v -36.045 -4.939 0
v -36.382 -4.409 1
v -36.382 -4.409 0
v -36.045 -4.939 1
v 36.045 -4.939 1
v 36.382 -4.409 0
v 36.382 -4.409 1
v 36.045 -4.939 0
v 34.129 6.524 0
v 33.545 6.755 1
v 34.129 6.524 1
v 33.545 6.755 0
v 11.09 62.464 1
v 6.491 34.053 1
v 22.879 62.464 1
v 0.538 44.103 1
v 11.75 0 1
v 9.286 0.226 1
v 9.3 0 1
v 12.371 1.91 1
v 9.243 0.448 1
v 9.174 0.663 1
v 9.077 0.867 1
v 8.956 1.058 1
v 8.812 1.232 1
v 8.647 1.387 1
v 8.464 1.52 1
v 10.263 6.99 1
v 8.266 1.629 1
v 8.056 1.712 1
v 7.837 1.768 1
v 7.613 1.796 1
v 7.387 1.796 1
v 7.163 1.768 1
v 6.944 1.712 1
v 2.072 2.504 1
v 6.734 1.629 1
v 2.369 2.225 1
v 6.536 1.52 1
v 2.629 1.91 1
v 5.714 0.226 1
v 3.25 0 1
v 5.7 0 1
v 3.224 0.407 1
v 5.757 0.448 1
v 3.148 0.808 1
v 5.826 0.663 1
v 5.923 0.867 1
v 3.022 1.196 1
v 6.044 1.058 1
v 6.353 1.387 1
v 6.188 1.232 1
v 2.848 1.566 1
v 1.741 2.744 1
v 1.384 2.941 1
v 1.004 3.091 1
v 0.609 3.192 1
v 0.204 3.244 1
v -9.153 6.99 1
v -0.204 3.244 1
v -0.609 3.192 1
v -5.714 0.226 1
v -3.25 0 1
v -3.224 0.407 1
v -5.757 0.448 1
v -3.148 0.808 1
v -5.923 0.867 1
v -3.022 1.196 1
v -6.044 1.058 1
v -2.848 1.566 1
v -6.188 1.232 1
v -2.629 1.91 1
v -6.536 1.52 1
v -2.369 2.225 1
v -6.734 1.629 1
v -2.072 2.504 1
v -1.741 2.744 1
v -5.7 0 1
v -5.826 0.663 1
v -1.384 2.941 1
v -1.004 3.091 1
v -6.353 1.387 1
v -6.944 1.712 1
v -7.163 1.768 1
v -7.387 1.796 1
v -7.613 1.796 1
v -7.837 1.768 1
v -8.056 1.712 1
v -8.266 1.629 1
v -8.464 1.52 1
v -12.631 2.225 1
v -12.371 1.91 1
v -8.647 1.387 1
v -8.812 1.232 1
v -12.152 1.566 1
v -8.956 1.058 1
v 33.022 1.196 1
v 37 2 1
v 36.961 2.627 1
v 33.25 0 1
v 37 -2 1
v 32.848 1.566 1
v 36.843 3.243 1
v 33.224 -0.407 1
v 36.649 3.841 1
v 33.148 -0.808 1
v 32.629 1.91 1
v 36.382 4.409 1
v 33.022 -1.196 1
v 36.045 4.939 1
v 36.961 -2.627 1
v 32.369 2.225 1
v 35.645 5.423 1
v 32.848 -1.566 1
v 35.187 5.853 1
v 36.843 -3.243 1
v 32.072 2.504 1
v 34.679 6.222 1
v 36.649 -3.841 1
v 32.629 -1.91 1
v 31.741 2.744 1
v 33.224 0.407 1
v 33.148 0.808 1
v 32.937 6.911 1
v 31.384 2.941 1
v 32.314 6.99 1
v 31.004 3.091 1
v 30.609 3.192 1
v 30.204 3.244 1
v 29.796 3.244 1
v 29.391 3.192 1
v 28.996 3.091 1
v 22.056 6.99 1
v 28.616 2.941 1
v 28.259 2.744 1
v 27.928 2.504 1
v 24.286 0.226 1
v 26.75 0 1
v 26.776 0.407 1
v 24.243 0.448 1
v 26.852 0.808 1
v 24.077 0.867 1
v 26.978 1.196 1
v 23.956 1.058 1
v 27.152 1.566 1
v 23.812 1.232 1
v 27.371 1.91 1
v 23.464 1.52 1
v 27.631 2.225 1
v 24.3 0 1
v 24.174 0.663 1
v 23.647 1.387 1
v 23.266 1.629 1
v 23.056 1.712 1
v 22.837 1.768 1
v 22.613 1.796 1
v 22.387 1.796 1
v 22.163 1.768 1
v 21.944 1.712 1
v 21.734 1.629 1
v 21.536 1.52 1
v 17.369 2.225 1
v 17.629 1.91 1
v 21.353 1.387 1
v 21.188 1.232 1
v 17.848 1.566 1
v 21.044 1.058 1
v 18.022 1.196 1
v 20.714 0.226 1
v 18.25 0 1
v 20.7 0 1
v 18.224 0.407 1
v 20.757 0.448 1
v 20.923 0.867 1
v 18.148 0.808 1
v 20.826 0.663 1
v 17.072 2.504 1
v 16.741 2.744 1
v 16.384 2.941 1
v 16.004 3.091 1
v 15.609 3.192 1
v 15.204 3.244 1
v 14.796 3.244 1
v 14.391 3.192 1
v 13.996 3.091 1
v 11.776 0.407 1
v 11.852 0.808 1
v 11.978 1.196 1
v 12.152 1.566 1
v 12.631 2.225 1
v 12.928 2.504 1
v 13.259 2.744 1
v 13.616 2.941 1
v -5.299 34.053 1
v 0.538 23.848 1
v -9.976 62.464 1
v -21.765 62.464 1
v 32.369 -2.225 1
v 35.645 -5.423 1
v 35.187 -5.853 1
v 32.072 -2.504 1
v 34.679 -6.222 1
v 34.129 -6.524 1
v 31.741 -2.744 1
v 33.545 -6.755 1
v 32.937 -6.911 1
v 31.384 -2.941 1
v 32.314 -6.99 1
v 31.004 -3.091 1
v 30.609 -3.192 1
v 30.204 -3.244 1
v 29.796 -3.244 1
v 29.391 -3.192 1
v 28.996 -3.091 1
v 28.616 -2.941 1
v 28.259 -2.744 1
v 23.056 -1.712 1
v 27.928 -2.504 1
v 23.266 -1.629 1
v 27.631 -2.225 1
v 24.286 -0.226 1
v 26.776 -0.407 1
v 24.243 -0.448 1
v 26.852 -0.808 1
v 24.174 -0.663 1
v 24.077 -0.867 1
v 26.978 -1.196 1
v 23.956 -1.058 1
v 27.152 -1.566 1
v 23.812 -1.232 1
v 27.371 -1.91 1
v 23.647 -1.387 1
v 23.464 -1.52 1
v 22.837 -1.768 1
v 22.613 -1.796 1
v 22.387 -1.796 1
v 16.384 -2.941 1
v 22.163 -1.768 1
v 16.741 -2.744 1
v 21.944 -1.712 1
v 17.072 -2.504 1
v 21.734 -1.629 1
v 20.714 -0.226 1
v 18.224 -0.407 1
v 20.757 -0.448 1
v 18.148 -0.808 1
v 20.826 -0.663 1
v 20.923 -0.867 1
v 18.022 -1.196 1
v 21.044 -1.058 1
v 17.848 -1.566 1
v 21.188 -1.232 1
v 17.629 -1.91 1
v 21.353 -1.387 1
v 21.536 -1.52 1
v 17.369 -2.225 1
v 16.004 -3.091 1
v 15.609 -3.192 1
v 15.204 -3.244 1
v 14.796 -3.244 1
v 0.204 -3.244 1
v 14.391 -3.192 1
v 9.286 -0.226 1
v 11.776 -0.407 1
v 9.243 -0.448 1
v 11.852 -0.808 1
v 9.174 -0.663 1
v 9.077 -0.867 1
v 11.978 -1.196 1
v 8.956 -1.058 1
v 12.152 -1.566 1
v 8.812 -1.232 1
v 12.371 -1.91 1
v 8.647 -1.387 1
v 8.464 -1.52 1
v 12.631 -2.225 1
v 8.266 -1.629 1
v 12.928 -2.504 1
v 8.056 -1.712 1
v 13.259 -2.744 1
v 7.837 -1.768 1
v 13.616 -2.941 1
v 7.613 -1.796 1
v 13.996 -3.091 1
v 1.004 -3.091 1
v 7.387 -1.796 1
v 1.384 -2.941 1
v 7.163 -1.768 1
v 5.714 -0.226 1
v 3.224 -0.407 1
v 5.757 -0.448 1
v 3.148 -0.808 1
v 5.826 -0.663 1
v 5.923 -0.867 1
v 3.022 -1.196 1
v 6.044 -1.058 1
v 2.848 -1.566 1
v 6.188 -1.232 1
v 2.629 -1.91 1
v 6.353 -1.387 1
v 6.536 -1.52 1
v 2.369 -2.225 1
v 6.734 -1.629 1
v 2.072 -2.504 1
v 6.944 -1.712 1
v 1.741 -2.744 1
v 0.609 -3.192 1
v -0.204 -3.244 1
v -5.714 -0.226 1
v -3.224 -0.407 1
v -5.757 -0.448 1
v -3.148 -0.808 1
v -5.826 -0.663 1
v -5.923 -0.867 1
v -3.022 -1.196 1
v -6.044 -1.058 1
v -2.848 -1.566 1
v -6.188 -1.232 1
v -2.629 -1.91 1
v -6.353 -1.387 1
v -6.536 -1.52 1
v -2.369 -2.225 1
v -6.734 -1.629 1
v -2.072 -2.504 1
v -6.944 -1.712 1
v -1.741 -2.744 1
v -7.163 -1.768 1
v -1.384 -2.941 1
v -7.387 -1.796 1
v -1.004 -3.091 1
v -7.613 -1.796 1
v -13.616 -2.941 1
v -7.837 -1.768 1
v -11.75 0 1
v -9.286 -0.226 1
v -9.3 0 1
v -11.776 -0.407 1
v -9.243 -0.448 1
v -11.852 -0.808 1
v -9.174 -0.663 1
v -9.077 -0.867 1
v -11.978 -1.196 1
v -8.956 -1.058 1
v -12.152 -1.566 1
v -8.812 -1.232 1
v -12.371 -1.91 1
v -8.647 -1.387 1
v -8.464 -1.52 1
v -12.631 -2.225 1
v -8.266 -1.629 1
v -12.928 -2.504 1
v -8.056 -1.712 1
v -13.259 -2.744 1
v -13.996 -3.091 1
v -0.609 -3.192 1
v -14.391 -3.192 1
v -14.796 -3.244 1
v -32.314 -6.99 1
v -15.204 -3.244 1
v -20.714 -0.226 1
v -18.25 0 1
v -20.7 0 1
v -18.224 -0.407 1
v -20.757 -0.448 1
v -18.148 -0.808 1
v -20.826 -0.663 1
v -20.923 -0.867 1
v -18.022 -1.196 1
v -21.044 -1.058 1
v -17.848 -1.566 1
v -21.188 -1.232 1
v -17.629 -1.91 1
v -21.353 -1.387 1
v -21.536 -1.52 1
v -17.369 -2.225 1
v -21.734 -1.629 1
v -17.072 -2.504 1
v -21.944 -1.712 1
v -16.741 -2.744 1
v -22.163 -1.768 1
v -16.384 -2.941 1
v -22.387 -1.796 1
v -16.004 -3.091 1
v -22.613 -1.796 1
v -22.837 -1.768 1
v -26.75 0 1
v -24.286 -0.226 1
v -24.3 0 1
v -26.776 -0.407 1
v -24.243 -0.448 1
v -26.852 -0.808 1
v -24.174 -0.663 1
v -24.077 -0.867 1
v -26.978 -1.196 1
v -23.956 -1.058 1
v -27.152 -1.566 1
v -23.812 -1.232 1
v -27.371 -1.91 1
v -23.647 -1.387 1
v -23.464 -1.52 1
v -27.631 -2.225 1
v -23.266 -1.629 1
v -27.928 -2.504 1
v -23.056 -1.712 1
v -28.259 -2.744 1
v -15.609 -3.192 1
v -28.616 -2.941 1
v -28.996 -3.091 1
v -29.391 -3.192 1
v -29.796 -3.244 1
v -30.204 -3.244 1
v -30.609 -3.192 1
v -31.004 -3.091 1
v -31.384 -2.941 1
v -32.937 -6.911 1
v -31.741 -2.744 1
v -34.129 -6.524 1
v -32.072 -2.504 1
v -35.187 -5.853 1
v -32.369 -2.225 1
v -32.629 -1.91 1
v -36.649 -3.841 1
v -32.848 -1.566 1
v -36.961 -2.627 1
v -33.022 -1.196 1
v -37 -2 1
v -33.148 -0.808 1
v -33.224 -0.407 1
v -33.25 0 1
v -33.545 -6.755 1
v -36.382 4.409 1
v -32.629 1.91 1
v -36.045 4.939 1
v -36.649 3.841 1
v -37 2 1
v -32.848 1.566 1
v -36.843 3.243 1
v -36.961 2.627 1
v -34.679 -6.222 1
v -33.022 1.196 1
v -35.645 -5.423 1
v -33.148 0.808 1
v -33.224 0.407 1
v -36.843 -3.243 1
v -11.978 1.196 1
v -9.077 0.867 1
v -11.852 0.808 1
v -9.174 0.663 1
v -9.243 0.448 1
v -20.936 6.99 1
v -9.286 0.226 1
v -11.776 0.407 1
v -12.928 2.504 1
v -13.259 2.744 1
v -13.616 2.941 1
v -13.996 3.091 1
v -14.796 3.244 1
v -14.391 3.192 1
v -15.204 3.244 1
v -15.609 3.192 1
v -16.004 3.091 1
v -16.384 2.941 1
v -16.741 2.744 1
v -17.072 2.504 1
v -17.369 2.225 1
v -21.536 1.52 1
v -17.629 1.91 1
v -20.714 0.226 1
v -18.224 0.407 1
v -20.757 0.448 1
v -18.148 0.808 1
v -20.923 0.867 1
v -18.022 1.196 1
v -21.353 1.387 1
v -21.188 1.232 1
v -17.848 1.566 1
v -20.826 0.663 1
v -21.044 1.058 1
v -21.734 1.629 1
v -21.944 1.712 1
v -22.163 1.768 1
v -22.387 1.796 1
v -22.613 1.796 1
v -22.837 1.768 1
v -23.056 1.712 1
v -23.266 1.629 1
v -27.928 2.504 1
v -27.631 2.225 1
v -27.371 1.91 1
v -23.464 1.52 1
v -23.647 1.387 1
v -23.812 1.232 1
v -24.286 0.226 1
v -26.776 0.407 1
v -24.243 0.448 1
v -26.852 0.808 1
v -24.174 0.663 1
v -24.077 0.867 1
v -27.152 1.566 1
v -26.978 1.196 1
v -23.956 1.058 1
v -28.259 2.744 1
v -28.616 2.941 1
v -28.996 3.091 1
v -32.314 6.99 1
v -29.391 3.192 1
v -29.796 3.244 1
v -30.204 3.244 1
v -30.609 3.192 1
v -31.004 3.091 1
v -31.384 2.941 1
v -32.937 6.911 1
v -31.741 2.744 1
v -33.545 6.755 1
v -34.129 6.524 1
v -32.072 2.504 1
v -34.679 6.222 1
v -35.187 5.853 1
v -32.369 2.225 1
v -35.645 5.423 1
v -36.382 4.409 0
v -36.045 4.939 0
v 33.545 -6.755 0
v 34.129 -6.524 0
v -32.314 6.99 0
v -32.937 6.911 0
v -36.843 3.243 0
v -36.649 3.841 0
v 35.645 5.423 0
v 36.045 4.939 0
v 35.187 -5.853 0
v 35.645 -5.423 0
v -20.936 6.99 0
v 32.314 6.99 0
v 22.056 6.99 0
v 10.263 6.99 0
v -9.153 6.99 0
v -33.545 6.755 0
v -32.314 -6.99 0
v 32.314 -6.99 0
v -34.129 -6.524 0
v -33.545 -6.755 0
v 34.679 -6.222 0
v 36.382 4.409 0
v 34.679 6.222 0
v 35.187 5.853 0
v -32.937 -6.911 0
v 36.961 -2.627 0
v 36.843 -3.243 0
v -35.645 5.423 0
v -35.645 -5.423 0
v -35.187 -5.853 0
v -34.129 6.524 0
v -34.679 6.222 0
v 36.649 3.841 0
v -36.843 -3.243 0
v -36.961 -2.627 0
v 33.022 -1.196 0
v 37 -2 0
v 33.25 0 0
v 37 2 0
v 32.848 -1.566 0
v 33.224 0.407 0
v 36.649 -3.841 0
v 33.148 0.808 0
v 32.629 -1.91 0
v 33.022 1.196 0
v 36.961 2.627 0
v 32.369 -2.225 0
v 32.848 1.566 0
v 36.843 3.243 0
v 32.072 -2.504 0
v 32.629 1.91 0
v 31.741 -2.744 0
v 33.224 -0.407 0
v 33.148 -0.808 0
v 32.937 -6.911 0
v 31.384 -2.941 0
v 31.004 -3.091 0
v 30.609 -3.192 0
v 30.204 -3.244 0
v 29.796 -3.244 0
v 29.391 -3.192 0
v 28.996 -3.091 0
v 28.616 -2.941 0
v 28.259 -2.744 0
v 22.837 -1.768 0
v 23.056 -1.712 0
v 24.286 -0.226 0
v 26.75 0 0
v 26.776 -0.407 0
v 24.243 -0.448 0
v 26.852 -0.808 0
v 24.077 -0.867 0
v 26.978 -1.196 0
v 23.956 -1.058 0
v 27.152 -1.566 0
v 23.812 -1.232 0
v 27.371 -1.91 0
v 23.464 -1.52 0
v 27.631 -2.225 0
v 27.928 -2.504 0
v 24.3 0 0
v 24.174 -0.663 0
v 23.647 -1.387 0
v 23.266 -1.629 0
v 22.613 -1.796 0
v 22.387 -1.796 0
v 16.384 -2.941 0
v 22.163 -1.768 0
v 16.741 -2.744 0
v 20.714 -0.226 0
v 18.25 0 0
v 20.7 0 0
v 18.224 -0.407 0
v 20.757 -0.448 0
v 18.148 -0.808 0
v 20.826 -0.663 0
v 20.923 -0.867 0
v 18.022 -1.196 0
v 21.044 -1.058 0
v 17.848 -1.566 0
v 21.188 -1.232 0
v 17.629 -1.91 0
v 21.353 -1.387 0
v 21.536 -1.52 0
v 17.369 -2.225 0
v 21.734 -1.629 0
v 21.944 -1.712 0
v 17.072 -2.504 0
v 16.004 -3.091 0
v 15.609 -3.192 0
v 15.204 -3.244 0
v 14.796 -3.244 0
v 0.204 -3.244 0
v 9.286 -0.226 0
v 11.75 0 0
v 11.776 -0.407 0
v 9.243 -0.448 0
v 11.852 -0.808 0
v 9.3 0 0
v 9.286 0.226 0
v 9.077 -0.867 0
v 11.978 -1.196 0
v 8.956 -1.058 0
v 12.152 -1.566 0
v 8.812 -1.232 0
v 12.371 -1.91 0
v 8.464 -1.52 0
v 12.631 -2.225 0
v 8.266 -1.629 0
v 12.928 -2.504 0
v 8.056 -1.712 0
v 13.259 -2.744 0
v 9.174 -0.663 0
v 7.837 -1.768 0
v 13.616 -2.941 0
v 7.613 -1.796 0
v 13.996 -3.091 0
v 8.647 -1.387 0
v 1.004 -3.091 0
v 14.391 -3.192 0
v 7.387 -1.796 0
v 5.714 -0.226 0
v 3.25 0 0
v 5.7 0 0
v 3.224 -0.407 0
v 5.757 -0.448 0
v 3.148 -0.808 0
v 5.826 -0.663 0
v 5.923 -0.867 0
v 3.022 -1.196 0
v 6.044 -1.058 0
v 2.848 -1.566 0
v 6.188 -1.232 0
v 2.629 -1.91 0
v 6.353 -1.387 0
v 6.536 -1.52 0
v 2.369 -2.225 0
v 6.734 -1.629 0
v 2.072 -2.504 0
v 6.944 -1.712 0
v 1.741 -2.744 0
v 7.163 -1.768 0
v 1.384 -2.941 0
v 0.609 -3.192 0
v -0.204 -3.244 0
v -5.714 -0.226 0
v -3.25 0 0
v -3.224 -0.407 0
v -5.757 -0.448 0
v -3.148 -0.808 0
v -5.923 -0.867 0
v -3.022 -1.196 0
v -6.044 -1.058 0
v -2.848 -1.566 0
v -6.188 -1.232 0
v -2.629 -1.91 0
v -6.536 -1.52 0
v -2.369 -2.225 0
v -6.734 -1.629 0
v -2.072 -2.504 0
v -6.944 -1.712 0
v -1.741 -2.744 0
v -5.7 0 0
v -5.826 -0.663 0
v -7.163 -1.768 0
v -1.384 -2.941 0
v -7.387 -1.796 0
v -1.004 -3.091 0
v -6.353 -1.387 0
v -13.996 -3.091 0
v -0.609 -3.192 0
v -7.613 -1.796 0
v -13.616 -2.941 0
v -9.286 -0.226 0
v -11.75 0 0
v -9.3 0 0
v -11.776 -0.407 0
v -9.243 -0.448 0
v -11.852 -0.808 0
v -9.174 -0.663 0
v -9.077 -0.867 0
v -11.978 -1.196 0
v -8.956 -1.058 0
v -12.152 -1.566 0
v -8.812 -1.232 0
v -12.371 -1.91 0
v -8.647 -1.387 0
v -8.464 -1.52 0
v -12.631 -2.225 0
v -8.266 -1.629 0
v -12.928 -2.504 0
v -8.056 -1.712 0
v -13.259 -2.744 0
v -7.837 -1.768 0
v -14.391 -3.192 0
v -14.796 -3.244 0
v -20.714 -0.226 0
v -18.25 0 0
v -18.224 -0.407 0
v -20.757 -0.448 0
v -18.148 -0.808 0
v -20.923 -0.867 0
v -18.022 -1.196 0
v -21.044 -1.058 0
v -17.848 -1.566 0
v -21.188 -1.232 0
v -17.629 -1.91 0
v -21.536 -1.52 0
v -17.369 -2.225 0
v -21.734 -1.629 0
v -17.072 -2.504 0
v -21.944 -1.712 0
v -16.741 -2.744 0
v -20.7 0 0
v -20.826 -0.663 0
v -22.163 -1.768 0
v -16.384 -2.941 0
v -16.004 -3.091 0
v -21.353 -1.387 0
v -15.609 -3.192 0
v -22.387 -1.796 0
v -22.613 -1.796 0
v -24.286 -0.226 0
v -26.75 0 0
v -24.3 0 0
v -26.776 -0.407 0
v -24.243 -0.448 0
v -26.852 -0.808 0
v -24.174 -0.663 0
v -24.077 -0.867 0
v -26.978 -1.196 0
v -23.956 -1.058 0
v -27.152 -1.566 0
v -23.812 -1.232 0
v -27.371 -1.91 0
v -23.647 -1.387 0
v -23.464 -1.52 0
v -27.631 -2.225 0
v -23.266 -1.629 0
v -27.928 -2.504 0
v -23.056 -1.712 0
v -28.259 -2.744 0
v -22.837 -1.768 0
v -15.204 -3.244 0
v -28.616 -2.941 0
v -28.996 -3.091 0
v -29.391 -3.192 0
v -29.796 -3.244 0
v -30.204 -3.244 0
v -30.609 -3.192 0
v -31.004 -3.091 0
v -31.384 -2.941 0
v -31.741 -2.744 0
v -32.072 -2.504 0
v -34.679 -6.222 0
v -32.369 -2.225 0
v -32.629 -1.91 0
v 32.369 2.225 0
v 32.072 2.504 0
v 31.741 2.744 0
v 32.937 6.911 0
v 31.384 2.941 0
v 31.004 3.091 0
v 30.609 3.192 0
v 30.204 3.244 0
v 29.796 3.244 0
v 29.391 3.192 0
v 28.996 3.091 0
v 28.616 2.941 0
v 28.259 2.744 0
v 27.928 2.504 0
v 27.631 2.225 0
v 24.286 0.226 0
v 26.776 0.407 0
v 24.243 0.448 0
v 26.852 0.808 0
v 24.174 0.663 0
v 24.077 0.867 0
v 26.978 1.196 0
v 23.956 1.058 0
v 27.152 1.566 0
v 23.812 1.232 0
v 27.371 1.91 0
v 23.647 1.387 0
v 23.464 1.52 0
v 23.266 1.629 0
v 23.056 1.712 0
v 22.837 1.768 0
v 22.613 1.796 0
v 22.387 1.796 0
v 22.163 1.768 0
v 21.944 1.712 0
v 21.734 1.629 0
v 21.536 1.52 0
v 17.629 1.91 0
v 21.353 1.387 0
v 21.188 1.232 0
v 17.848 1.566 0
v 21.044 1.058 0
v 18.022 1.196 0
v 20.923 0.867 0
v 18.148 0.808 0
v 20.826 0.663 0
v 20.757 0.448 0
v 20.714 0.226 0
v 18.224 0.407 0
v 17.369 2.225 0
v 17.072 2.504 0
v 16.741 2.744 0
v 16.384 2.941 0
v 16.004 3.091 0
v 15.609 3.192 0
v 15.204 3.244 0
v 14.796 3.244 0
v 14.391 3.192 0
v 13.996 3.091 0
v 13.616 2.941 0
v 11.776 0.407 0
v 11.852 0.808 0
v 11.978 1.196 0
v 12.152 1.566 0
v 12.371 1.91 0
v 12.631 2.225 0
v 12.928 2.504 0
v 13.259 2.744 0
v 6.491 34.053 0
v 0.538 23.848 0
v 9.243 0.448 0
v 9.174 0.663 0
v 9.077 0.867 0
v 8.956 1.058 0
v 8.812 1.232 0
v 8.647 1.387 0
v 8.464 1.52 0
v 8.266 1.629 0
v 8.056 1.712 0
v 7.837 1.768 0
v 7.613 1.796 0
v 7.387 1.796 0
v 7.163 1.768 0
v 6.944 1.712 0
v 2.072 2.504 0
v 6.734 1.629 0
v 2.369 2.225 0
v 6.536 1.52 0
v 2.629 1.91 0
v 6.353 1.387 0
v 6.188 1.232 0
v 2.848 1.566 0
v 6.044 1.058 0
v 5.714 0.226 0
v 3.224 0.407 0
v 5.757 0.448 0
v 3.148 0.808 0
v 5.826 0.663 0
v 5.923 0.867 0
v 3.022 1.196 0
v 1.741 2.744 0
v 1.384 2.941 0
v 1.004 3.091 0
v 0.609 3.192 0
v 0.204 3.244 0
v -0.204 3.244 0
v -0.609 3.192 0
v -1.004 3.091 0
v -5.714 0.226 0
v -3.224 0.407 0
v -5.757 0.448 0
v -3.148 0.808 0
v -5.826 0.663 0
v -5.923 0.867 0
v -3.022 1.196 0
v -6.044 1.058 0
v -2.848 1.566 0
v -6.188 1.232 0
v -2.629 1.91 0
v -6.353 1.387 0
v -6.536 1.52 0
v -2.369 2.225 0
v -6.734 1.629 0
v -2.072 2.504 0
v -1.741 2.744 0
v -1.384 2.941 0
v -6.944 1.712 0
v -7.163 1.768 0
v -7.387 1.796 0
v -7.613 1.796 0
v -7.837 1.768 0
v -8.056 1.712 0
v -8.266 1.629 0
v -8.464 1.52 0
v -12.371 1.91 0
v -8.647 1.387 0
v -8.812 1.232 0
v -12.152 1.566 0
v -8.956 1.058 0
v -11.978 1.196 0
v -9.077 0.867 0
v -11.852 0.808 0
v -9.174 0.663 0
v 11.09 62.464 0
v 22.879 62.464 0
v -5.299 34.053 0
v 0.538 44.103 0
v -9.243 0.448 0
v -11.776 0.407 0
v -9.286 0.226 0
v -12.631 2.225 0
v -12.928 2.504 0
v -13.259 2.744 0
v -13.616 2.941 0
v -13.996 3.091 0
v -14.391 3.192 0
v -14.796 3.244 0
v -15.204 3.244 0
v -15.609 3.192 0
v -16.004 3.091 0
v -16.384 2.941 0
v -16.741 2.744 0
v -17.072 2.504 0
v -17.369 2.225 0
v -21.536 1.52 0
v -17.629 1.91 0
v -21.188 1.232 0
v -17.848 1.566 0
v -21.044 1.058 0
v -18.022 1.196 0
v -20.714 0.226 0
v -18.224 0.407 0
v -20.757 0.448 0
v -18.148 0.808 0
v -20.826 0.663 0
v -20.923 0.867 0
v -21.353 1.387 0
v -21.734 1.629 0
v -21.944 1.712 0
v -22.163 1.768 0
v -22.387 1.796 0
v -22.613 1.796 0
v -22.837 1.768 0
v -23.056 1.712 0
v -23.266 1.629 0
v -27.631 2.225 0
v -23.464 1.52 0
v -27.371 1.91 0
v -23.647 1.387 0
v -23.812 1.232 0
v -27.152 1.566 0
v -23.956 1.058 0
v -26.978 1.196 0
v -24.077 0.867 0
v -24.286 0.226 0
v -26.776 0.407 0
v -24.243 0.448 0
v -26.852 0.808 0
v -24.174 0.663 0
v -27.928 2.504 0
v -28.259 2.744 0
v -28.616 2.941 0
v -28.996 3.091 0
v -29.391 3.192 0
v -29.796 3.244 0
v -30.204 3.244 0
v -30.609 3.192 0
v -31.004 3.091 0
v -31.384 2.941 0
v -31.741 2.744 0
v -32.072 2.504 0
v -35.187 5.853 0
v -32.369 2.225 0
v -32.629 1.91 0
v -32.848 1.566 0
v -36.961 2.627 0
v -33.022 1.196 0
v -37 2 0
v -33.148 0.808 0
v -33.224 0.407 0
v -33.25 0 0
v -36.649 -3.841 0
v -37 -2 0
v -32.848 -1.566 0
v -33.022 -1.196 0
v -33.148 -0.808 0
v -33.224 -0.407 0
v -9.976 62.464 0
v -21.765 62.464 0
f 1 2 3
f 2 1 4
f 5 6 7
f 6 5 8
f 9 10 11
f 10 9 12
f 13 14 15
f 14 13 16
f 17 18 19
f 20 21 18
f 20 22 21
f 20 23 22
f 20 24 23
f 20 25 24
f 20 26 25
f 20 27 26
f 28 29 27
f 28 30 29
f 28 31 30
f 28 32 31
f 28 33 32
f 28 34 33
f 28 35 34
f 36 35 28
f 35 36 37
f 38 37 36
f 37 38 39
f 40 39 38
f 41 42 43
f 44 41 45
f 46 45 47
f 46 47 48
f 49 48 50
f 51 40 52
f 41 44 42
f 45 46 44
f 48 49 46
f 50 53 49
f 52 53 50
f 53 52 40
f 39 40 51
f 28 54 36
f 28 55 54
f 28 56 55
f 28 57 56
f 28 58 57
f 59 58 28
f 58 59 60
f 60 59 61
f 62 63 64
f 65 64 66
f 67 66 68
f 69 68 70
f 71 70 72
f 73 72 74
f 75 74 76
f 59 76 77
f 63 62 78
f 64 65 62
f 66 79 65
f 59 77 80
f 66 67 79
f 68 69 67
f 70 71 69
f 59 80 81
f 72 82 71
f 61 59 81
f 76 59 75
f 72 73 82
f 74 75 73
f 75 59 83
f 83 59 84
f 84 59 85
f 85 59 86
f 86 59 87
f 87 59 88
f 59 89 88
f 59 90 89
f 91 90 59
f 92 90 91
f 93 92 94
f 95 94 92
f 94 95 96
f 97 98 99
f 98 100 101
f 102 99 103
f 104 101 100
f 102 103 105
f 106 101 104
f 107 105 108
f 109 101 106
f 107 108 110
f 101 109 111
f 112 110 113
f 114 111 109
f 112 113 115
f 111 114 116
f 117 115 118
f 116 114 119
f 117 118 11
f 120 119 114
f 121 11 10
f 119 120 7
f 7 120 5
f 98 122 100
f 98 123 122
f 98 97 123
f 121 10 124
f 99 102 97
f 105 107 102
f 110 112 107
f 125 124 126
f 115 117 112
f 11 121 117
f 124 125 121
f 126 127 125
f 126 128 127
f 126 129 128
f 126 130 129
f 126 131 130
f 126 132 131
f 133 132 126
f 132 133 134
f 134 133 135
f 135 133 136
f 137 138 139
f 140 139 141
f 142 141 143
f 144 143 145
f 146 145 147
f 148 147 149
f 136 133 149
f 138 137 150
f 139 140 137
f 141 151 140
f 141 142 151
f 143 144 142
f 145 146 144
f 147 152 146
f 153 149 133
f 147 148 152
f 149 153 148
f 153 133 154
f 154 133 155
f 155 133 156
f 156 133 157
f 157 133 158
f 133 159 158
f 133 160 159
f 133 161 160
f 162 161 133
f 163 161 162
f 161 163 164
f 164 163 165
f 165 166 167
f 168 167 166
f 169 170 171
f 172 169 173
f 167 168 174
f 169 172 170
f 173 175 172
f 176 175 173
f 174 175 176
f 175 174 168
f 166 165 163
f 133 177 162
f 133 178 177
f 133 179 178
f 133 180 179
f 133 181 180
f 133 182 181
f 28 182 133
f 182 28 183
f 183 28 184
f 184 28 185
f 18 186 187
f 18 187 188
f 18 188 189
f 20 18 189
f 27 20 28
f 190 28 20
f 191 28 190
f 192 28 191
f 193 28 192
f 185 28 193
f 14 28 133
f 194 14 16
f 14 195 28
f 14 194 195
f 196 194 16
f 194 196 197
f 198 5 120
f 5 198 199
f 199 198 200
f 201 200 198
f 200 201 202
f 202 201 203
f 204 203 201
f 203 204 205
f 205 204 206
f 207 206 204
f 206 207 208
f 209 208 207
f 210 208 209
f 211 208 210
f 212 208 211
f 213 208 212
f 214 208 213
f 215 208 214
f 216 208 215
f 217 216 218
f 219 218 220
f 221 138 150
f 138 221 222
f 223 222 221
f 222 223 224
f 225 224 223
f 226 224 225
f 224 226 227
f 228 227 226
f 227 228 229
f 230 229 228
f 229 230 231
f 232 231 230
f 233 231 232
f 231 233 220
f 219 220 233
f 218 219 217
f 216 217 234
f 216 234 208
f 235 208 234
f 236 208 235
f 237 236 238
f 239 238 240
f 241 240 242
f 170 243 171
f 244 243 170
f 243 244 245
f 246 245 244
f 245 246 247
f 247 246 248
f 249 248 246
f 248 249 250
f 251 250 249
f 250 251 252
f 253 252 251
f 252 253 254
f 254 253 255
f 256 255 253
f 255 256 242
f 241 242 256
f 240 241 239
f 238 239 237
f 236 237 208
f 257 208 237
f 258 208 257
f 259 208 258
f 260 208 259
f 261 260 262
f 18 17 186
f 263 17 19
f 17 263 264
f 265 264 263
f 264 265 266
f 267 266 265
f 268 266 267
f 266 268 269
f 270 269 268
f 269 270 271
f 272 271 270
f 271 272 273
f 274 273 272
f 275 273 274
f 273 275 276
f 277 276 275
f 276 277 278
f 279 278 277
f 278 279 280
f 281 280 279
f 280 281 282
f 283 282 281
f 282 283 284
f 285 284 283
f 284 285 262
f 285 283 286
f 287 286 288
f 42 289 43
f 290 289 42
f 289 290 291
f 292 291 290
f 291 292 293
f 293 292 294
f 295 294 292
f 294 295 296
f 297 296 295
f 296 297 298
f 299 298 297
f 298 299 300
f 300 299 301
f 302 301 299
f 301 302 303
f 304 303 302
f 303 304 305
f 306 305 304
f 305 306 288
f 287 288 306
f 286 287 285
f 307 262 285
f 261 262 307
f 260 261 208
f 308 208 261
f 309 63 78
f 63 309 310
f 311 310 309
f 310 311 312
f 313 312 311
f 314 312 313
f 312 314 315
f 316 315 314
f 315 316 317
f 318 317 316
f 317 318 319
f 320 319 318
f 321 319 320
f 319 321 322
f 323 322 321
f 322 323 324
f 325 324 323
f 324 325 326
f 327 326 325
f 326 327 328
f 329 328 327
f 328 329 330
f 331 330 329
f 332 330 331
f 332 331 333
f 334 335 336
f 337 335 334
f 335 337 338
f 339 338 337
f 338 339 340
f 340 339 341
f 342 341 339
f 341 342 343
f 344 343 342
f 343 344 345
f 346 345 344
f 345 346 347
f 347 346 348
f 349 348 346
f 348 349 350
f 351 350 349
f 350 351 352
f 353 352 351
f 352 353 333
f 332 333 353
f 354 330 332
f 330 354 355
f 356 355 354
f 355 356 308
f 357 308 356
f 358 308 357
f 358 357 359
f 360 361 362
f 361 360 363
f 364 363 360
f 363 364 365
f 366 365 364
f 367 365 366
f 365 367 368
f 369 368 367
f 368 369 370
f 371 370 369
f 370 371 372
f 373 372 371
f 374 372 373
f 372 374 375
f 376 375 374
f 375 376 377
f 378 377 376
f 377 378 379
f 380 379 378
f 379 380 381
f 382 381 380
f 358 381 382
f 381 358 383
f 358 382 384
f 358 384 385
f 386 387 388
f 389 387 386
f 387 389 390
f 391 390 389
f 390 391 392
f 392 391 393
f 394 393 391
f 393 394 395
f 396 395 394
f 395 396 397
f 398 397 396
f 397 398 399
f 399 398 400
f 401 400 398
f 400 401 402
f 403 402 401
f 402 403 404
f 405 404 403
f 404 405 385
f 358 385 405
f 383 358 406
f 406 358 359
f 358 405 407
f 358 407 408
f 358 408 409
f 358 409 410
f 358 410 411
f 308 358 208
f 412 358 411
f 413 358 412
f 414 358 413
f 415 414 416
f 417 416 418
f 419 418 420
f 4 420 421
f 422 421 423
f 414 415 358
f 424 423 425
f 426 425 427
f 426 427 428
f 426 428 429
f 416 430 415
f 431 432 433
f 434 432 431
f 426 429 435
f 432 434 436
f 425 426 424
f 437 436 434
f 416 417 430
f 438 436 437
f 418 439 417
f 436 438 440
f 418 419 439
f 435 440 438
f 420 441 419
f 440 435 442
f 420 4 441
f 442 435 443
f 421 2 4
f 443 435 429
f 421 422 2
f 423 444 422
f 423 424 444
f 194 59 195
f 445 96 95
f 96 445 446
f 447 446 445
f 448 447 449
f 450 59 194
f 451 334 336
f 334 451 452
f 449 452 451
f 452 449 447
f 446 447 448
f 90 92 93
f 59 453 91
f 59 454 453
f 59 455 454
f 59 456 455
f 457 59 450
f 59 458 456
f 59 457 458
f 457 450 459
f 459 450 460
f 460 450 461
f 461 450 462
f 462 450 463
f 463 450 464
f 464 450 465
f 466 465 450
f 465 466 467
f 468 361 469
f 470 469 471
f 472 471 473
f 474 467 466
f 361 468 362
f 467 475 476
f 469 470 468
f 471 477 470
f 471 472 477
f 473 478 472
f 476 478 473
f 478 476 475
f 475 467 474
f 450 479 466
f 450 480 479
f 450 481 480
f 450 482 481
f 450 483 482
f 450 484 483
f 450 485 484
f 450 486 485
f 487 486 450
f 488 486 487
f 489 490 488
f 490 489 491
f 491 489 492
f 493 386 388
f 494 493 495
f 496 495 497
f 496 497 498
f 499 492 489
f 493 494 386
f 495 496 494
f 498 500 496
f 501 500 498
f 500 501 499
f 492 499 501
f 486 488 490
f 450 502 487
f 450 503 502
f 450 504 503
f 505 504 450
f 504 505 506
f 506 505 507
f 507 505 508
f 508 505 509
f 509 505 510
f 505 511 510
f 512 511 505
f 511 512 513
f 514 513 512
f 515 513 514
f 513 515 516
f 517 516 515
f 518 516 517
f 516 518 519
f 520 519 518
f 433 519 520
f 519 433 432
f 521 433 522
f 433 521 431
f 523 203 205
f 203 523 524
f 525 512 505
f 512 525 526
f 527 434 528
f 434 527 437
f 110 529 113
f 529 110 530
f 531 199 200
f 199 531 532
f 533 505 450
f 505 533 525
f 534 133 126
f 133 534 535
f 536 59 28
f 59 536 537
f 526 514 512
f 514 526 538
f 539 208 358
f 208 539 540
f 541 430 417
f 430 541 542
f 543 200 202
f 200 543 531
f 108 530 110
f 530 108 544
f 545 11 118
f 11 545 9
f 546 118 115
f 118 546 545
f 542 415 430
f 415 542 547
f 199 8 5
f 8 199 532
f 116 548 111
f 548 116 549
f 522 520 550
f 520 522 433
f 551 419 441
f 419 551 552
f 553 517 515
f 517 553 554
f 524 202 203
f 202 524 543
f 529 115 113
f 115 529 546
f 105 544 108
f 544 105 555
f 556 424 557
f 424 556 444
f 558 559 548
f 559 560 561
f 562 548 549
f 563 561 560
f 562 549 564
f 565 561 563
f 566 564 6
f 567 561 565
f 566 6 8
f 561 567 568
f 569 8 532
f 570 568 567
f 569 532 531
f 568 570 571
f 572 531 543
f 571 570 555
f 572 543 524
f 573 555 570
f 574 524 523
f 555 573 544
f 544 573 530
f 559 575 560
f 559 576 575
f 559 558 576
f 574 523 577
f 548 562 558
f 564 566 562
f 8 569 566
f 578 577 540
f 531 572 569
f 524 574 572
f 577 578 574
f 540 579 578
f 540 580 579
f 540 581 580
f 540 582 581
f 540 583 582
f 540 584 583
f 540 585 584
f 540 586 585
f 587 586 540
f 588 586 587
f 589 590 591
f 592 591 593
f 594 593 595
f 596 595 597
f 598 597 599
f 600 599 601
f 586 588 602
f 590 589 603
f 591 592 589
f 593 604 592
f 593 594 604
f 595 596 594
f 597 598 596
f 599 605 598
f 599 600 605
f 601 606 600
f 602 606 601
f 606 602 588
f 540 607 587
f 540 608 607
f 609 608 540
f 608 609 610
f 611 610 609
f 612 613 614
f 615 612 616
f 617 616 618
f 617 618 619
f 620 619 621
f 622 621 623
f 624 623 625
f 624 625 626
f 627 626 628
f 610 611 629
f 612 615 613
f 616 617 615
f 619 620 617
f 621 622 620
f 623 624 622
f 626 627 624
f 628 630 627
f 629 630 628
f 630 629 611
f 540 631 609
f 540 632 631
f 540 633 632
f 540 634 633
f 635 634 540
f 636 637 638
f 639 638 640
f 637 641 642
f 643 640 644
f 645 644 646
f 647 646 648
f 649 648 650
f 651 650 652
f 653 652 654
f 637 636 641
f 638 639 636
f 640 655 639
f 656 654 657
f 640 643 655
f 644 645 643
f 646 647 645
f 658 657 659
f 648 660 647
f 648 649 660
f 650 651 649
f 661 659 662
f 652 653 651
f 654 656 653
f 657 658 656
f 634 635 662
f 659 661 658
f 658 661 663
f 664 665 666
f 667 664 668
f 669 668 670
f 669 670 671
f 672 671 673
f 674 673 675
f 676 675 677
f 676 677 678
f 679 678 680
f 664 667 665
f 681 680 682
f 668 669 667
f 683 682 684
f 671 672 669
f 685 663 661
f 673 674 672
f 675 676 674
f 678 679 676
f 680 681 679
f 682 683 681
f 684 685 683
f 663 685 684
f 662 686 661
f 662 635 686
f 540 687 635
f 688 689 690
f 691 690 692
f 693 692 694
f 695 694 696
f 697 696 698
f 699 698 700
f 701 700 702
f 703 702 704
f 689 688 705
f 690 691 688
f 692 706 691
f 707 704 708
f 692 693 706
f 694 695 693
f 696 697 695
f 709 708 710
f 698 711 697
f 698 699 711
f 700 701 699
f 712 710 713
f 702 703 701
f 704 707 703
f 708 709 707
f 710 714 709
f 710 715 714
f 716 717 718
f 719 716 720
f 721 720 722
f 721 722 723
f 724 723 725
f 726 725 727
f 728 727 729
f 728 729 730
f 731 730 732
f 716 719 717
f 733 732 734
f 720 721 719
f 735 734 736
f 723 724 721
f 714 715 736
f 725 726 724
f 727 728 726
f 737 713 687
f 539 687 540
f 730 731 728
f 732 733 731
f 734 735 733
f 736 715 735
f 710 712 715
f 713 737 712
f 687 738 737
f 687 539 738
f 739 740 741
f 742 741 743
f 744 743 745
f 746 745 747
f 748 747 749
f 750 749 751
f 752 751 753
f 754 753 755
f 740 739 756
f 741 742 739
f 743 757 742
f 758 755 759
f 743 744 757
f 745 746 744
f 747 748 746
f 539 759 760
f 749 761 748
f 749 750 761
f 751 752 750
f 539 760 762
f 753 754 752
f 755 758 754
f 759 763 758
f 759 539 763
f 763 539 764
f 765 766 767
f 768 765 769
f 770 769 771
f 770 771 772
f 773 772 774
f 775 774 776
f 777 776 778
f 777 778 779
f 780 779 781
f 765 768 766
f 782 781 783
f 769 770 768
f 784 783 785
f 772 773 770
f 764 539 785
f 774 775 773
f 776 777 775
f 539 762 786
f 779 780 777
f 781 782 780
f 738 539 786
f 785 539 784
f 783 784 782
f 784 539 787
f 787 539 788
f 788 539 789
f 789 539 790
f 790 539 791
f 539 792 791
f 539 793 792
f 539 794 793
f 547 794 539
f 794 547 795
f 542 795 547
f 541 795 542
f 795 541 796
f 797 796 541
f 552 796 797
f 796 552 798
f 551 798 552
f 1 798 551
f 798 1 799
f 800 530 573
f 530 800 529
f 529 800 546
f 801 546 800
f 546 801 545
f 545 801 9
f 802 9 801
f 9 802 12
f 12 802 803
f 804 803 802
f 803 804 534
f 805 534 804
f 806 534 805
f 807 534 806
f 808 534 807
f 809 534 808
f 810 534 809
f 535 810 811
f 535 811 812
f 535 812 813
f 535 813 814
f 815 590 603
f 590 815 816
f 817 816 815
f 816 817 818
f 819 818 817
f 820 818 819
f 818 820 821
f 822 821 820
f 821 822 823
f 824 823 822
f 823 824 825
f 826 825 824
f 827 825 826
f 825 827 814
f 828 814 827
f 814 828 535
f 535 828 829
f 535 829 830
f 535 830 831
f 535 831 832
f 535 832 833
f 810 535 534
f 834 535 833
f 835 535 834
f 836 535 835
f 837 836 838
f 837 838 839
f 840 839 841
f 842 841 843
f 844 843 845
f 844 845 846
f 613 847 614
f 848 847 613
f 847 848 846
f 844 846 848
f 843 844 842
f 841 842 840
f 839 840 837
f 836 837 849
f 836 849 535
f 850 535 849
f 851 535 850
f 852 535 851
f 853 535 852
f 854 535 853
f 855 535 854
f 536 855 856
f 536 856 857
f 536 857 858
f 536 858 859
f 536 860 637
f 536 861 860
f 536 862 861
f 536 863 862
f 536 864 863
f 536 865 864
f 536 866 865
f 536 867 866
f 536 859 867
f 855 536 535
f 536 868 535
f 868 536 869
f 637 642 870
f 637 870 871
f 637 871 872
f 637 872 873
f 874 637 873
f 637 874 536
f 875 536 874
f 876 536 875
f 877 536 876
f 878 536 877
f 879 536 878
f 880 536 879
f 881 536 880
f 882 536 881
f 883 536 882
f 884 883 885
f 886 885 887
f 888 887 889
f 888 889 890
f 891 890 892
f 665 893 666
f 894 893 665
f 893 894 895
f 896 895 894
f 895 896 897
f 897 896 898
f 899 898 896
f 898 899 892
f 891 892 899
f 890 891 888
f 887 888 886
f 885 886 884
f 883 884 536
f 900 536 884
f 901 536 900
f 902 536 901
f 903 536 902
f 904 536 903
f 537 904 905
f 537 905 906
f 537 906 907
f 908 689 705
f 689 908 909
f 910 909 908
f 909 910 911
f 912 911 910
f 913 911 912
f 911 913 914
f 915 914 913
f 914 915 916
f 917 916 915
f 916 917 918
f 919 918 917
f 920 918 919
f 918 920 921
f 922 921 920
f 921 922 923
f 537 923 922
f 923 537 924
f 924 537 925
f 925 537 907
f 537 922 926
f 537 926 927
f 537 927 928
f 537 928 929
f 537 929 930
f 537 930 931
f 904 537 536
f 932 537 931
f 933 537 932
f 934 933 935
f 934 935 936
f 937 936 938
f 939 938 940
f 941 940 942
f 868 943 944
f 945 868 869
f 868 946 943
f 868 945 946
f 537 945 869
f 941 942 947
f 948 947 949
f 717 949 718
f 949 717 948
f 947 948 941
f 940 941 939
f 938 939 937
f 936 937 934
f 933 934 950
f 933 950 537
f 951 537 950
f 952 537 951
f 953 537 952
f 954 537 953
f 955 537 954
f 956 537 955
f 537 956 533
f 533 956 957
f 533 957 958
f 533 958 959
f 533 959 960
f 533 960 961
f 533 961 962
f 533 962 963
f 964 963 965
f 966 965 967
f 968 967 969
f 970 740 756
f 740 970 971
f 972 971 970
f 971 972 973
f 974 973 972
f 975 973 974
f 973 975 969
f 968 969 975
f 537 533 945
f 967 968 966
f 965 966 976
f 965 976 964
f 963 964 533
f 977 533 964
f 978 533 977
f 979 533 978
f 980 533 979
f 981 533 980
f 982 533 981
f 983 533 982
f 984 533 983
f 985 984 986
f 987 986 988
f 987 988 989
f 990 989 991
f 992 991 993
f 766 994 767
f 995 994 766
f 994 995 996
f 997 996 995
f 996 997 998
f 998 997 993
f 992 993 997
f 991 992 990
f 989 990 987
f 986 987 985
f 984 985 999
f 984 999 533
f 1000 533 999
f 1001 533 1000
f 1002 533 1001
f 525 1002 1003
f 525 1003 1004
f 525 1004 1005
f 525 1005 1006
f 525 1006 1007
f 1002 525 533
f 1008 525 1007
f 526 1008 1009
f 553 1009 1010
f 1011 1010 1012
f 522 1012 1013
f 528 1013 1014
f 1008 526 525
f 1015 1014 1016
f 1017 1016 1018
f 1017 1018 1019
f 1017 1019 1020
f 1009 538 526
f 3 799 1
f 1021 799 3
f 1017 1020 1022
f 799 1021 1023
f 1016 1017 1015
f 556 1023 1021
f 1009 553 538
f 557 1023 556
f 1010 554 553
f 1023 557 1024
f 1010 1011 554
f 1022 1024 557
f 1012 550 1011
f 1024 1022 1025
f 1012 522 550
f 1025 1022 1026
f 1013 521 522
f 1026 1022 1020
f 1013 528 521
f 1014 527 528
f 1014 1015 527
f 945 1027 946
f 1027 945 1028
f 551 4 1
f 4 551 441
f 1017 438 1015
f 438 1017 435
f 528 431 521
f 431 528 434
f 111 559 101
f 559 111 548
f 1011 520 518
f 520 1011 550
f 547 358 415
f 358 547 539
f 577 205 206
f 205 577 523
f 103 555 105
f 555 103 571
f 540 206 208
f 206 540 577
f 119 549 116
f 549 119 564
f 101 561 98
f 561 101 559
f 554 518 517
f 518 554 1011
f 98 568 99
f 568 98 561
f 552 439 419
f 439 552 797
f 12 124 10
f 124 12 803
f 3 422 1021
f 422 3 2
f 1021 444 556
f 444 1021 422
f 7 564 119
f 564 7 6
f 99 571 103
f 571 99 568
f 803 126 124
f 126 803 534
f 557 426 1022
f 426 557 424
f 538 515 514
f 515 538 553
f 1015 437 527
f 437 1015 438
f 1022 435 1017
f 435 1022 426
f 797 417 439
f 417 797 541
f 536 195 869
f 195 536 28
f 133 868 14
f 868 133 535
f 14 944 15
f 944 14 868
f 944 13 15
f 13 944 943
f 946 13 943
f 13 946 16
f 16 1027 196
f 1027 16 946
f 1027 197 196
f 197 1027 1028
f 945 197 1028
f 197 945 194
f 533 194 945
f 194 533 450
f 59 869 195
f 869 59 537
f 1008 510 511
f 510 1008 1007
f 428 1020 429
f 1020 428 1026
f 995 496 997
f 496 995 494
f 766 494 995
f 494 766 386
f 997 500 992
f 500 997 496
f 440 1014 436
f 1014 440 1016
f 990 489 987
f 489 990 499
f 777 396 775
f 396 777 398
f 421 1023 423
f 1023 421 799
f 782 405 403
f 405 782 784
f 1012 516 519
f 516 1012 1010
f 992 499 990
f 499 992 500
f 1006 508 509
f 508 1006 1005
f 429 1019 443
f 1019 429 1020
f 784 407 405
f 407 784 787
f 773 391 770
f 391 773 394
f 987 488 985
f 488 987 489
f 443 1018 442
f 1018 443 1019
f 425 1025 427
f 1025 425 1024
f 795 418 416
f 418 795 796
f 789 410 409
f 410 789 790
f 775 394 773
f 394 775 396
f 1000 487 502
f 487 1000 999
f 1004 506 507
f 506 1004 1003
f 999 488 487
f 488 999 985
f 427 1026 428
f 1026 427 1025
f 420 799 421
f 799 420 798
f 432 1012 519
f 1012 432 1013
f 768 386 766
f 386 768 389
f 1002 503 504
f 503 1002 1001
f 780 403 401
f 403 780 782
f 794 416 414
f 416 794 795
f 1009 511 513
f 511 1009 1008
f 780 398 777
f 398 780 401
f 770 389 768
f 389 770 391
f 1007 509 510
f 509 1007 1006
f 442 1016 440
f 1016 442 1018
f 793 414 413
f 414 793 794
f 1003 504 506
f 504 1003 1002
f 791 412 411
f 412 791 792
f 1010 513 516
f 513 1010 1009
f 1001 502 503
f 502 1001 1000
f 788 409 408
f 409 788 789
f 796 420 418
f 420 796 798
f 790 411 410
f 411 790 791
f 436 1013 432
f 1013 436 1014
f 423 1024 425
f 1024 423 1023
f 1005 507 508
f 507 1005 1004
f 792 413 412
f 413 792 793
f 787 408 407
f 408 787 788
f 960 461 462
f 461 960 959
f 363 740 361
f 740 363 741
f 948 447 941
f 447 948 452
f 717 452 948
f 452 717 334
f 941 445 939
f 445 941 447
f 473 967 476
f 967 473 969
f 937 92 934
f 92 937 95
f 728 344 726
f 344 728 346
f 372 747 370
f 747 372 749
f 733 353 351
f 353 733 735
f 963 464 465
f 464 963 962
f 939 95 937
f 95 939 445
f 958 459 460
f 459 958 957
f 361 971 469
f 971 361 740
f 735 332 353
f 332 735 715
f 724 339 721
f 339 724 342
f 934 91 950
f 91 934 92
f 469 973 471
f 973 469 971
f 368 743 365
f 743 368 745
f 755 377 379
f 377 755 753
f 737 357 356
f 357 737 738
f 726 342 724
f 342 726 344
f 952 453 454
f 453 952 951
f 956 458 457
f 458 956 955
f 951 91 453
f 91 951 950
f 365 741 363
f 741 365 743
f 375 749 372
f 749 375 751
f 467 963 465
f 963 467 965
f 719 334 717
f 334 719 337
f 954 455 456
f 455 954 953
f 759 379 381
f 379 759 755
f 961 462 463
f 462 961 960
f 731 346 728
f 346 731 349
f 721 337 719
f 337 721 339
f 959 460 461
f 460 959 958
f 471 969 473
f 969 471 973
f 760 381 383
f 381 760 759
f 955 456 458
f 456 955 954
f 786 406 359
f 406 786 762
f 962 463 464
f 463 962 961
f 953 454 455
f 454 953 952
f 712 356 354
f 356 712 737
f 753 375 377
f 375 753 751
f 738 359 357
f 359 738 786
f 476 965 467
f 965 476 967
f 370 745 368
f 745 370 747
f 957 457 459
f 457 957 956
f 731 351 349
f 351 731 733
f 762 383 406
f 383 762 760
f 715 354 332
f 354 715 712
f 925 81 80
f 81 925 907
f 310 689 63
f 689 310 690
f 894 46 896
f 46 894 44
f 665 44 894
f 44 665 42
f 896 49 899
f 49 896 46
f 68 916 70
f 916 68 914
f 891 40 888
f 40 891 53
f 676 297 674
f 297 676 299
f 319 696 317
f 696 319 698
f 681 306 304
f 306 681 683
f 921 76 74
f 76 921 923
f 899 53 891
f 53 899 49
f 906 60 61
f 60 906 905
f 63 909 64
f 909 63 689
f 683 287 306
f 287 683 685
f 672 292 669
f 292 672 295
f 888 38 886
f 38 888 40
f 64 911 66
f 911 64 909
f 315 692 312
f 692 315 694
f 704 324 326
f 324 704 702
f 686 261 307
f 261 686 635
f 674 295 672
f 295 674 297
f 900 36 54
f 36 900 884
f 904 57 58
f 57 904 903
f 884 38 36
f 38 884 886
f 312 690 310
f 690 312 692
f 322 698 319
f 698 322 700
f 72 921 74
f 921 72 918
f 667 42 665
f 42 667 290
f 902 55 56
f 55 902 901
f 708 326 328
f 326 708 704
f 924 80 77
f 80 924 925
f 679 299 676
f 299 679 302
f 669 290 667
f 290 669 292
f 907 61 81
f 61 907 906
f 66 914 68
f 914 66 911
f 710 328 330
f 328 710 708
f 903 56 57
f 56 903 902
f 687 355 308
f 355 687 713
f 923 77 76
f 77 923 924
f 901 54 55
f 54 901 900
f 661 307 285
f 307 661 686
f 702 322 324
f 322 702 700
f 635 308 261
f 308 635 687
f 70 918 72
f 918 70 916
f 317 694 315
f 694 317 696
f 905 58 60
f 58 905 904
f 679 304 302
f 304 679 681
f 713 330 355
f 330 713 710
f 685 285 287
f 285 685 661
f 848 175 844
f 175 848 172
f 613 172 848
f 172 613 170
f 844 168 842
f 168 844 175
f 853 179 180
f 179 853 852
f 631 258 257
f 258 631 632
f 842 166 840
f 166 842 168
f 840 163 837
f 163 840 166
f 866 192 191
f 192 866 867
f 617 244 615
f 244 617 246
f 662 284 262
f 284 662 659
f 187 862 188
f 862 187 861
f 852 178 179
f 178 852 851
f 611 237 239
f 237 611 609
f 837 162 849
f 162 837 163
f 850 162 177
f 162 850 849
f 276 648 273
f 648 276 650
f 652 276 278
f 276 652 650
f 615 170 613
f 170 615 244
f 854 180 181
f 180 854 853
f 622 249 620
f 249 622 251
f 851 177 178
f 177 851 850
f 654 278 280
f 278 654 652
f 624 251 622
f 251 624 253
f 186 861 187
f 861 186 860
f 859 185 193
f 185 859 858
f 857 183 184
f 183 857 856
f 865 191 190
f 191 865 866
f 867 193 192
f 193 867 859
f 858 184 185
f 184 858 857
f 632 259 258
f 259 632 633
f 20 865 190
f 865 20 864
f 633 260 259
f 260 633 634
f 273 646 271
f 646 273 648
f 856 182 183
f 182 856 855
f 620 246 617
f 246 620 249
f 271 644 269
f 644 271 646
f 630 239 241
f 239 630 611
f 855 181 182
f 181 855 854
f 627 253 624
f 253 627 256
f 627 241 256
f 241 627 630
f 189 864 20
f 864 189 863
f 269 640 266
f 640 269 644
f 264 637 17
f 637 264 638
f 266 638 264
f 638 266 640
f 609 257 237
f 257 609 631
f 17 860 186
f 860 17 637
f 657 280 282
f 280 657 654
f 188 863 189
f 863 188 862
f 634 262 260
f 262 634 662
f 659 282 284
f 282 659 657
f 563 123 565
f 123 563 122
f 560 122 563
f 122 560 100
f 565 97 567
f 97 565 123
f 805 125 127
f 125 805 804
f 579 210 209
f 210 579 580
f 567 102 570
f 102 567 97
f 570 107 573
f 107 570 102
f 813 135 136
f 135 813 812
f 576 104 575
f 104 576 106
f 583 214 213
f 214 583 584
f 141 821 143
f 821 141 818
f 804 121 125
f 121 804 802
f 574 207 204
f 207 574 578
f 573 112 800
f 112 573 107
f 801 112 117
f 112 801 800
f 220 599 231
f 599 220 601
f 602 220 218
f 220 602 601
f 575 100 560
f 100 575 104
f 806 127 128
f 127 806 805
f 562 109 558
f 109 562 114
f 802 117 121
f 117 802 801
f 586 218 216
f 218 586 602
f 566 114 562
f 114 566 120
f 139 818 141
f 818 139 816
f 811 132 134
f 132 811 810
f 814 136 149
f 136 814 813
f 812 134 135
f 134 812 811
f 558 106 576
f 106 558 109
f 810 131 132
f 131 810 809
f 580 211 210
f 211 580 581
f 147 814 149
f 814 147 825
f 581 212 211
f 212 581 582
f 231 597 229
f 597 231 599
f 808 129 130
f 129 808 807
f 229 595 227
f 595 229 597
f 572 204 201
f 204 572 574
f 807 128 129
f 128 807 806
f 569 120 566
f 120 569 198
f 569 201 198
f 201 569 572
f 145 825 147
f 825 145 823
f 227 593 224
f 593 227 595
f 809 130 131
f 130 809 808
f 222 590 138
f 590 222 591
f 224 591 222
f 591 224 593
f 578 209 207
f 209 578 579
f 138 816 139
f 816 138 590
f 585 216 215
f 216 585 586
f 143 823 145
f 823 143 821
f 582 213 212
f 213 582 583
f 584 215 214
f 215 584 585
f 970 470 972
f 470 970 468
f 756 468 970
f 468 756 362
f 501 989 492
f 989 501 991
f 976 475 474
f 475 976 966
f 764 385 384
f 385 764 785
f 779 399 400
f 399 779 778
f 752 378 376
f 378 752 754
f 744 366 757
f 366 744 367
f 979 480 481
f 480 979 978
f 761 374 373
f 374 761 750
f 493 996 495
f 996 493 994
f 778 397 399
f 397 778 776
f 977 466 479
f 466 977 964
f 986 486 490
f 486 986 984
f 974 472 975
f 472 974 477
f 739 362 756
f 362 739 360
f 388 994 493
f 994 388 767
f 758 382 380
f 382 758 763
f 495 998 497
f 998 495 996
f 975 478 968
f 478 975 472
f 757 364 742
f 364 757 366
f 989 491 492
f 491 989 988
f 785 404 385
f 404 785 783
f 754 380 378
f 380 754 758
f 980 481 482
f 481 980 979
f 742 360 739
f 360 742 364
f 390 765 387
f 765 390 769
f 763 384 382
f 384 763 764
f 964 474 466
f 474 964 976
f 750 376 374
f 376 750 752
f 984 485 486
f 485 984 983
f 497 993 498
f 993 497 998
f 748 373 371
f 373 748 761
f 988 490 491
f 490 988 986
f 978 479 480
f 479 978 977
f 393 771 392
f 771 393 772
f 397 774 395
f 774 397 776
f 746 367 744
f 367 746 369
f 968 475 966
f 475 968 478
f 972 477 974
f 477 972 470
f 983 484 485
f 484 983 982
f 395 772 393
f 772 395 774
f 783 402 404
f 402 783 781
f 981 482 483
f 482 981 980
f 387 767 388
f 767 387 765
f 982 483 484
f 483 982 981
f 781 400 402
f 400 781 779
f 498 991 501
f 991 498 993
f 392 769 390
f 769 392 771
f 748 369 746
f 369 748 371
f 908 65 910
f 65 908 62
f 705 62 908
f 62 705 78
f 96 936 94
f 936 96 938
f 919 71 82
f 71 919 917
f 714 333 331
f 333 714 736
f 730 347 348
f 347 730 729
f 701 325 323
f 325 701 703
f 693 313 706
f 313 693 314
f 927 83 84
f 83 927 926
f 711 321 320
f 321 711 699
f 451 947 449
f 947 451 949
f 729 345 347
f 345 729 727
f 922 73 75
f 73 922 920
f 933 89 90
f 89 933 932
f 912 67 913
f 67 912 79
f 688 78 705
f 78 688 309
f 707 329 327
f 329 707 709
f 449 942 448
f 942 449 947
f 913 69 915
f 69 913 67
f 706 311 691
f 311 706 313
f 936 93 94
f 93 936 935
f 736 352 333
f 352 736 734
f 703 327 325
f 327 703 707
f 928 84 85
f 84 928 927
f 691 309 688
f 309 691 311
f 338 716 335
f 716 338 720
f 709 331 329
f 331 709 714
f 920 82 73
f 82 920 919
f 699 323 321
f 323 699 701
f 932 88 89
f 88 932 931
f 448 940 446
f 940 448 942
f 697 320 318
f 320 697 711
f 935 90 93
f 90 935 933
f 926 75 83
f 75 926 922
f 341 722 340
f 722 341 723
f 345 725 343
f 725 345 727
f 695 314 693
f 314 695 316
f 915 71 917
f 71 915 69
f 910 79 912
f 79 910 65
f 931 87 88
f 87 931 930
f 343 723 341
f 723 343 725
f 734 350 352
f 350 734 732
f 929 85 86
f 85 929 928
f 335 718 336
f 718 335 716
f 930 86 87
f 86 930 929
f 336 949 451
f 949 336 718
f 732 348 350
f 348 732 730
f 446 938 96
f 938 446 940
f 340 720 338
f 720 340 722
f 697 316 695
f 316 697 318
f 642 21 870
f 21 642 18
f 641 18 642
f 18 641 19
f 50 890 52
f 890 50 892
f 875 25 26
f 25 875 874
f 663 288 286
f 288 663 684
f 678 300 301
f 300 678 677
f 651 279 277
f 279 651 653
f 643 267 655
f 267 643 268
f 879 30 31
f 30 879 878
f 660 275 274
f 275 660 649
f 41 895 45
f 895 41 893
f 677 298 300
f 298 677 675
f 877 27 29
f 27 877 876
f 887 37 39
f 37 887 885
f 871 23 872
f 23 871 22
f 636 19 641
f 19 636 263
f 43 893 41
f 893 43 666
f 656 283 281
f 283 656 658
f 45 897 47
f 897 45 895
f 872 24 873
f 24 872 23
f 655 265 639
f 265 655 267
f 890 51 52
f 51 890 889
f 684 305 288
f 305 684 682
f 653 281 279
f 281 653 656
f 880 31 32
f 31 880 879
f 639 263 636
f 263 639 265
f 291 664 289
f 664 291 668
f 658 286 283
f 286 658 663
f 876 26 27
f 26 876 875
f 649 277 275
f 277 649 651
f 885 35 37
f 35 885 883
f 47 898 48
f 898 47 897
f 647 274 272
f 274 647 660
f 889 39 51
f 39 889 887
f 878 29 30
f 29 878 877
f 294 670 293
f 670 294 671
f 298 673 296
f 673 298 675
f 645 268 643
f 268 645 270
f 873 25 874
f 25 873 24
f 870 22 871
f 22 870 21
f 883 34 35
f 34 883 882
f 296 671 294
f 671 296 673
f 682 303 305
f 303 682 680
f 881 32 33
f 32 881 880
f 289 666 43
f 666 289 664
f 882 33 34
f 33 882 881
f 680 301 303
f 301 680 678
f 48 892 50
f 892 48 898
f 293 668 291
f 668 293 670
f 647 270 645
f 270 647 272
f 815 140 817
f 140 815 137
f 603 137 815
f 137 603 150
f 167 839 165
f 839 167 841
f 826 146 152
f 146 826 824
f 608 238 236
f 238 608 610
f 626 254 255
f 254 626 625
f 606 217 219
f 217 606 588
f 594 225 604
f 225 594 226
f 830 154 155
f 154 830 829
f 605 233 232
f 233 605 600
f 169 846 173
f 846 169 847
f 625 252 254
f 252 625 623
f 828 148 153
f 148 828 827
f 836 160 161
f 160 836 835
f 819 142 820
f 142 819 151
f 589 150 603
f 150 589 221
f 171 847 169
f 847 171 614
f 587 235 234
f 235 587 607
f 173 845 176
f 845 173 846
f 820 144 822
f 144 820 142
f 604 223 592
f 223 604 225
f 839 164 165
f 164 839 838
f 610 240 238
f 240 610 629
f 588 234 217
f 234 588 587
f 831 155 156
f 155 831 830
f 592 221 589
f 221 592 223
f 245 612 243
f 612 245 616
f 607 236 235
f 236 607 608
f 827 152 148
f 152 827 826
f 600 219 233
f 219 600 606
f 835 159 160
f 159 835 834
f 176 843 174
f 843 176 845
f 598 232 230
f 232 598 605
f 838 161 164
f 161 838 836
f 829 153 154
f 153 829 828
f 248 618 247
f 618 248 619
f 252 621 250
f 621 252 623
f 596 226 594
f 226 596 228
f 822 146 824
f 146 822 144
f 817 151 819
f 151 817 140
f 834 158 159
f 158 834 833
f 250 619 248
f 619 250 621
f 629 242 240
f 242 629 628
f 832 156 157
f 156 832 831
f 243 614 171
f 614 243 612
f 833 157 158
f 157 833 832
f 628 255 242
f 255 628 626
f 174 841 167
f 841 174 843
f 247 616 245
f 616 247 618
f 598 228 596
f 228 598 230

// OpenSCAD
$fn = 50;


difference() {
	union() {
		hull() {
			translate(v = [-32.0000000000, 2.0000000000, 0]) {
				cylinder(h = 1, r = 5);
			}
			translate(v = [32.0000000000, 2.0000000000, 0]) {
				cylinder(h = 1, r = 5);
			}
			translate(v = [-32.0000000000, -2.0000000000, 0]) {
				cylinder(h = 1, r = 5);
			}
			translate(v = [32.0000000000, -2.0000000000, 0]) {
				cylinder(h = 1, r = 5);
			}
		}
		translate(v = [0, 61.1111111111, 0]) {
			linear_extrude(height = 1) {
				text(font = "DejaVu Sans Mono:style=Bold", halign = "center", size = 57.0000000000, text = "X", valign = "top");
			}
		}
	}
	union() {
		translate(v = [-30.0000000000, 0.0000000000, 0]) {
			translate(v = [0, 0, -100]) {
				cylinder(h = 200, r = 3.2500000000);
			}
		}
		translate(v = [-15.0000000000, 0.0000000000, 0]) {
			translate(v = [0, 0, -100]) {
				cylinder(h = 200, r = 3.2500000000);
			}
		}
		translate(v = [0, 0, -100]) {
			cylinder(h = 200, r = 3.2500000000);
		}
		translate(v = [15.0000000000, 0.0000000000, 0]) {
			translate(v = [0, 0, -100]) {
				cylinder(h = 200, r = 3.2500000000);
			}
		}
		translate(v = [30.0000000000, 0.0000000000, 0]) {
			translate(v = [0, 0, -100]) {
				cylinder(h = 200, r = 3.2500000000);
			}
		}
		translate(v = [-30.0000000000, 0.0000000000, 0]) {
			translate(v = [0, 0, -100]) {
				cylinder(h = 200, r = 1.8000000000);
			}
		}
		translate(v = [-22.5000000000, 0.0000000000, 0]) {
			translate(v = [0, 0, -100]) {
				cylinder(h = 200, r = 1.8000000000);
			}
		}
		translate(v = [-15.0000000000, 0.0000000000, 0]) {
			translate(v = [0, 0, -100]) {
				cylinder(h = 200, r = 1.8000000000);
			}
		}
		translate(v = [-7.5000000000, 0.0000000000, 0]) {
			translate(v = [0, 0, -100]) {
				cylinder(h = 200, r = 1.8000000000);
			}
		}
		translate(v = [0, 0, -100]) {
			cylinder(h = 200, r = 1.8000000000);
		}
		translate(v = [7.5000000000, 0.0000000000, 0]) {
			translate(v = [0, 0, -100]) {
				cylinder(h = 200, r = 1.8000000000);
			}
		}
		translate(v = [15.0000000000, 0.0000000000, 0]) {
			translate(v = [0, 0, -100]) {
				cylinder(h = 200, r = 1.8000000000);
			}
		}
		translate(v = [22.5000000000, 0.0000000000, 0]) {
			translate(v = [0, 0, -100]) {
				cylinder(h = 200, r = 1.8000000000);
			}
		}
		translate(v = [30.0000000000, 0.0000000000, 0]) {
			translate(v = [0, 0, -100]) {
				cylinder(h = 200, r = 1.8000000000);
			}
		}
	}
}
